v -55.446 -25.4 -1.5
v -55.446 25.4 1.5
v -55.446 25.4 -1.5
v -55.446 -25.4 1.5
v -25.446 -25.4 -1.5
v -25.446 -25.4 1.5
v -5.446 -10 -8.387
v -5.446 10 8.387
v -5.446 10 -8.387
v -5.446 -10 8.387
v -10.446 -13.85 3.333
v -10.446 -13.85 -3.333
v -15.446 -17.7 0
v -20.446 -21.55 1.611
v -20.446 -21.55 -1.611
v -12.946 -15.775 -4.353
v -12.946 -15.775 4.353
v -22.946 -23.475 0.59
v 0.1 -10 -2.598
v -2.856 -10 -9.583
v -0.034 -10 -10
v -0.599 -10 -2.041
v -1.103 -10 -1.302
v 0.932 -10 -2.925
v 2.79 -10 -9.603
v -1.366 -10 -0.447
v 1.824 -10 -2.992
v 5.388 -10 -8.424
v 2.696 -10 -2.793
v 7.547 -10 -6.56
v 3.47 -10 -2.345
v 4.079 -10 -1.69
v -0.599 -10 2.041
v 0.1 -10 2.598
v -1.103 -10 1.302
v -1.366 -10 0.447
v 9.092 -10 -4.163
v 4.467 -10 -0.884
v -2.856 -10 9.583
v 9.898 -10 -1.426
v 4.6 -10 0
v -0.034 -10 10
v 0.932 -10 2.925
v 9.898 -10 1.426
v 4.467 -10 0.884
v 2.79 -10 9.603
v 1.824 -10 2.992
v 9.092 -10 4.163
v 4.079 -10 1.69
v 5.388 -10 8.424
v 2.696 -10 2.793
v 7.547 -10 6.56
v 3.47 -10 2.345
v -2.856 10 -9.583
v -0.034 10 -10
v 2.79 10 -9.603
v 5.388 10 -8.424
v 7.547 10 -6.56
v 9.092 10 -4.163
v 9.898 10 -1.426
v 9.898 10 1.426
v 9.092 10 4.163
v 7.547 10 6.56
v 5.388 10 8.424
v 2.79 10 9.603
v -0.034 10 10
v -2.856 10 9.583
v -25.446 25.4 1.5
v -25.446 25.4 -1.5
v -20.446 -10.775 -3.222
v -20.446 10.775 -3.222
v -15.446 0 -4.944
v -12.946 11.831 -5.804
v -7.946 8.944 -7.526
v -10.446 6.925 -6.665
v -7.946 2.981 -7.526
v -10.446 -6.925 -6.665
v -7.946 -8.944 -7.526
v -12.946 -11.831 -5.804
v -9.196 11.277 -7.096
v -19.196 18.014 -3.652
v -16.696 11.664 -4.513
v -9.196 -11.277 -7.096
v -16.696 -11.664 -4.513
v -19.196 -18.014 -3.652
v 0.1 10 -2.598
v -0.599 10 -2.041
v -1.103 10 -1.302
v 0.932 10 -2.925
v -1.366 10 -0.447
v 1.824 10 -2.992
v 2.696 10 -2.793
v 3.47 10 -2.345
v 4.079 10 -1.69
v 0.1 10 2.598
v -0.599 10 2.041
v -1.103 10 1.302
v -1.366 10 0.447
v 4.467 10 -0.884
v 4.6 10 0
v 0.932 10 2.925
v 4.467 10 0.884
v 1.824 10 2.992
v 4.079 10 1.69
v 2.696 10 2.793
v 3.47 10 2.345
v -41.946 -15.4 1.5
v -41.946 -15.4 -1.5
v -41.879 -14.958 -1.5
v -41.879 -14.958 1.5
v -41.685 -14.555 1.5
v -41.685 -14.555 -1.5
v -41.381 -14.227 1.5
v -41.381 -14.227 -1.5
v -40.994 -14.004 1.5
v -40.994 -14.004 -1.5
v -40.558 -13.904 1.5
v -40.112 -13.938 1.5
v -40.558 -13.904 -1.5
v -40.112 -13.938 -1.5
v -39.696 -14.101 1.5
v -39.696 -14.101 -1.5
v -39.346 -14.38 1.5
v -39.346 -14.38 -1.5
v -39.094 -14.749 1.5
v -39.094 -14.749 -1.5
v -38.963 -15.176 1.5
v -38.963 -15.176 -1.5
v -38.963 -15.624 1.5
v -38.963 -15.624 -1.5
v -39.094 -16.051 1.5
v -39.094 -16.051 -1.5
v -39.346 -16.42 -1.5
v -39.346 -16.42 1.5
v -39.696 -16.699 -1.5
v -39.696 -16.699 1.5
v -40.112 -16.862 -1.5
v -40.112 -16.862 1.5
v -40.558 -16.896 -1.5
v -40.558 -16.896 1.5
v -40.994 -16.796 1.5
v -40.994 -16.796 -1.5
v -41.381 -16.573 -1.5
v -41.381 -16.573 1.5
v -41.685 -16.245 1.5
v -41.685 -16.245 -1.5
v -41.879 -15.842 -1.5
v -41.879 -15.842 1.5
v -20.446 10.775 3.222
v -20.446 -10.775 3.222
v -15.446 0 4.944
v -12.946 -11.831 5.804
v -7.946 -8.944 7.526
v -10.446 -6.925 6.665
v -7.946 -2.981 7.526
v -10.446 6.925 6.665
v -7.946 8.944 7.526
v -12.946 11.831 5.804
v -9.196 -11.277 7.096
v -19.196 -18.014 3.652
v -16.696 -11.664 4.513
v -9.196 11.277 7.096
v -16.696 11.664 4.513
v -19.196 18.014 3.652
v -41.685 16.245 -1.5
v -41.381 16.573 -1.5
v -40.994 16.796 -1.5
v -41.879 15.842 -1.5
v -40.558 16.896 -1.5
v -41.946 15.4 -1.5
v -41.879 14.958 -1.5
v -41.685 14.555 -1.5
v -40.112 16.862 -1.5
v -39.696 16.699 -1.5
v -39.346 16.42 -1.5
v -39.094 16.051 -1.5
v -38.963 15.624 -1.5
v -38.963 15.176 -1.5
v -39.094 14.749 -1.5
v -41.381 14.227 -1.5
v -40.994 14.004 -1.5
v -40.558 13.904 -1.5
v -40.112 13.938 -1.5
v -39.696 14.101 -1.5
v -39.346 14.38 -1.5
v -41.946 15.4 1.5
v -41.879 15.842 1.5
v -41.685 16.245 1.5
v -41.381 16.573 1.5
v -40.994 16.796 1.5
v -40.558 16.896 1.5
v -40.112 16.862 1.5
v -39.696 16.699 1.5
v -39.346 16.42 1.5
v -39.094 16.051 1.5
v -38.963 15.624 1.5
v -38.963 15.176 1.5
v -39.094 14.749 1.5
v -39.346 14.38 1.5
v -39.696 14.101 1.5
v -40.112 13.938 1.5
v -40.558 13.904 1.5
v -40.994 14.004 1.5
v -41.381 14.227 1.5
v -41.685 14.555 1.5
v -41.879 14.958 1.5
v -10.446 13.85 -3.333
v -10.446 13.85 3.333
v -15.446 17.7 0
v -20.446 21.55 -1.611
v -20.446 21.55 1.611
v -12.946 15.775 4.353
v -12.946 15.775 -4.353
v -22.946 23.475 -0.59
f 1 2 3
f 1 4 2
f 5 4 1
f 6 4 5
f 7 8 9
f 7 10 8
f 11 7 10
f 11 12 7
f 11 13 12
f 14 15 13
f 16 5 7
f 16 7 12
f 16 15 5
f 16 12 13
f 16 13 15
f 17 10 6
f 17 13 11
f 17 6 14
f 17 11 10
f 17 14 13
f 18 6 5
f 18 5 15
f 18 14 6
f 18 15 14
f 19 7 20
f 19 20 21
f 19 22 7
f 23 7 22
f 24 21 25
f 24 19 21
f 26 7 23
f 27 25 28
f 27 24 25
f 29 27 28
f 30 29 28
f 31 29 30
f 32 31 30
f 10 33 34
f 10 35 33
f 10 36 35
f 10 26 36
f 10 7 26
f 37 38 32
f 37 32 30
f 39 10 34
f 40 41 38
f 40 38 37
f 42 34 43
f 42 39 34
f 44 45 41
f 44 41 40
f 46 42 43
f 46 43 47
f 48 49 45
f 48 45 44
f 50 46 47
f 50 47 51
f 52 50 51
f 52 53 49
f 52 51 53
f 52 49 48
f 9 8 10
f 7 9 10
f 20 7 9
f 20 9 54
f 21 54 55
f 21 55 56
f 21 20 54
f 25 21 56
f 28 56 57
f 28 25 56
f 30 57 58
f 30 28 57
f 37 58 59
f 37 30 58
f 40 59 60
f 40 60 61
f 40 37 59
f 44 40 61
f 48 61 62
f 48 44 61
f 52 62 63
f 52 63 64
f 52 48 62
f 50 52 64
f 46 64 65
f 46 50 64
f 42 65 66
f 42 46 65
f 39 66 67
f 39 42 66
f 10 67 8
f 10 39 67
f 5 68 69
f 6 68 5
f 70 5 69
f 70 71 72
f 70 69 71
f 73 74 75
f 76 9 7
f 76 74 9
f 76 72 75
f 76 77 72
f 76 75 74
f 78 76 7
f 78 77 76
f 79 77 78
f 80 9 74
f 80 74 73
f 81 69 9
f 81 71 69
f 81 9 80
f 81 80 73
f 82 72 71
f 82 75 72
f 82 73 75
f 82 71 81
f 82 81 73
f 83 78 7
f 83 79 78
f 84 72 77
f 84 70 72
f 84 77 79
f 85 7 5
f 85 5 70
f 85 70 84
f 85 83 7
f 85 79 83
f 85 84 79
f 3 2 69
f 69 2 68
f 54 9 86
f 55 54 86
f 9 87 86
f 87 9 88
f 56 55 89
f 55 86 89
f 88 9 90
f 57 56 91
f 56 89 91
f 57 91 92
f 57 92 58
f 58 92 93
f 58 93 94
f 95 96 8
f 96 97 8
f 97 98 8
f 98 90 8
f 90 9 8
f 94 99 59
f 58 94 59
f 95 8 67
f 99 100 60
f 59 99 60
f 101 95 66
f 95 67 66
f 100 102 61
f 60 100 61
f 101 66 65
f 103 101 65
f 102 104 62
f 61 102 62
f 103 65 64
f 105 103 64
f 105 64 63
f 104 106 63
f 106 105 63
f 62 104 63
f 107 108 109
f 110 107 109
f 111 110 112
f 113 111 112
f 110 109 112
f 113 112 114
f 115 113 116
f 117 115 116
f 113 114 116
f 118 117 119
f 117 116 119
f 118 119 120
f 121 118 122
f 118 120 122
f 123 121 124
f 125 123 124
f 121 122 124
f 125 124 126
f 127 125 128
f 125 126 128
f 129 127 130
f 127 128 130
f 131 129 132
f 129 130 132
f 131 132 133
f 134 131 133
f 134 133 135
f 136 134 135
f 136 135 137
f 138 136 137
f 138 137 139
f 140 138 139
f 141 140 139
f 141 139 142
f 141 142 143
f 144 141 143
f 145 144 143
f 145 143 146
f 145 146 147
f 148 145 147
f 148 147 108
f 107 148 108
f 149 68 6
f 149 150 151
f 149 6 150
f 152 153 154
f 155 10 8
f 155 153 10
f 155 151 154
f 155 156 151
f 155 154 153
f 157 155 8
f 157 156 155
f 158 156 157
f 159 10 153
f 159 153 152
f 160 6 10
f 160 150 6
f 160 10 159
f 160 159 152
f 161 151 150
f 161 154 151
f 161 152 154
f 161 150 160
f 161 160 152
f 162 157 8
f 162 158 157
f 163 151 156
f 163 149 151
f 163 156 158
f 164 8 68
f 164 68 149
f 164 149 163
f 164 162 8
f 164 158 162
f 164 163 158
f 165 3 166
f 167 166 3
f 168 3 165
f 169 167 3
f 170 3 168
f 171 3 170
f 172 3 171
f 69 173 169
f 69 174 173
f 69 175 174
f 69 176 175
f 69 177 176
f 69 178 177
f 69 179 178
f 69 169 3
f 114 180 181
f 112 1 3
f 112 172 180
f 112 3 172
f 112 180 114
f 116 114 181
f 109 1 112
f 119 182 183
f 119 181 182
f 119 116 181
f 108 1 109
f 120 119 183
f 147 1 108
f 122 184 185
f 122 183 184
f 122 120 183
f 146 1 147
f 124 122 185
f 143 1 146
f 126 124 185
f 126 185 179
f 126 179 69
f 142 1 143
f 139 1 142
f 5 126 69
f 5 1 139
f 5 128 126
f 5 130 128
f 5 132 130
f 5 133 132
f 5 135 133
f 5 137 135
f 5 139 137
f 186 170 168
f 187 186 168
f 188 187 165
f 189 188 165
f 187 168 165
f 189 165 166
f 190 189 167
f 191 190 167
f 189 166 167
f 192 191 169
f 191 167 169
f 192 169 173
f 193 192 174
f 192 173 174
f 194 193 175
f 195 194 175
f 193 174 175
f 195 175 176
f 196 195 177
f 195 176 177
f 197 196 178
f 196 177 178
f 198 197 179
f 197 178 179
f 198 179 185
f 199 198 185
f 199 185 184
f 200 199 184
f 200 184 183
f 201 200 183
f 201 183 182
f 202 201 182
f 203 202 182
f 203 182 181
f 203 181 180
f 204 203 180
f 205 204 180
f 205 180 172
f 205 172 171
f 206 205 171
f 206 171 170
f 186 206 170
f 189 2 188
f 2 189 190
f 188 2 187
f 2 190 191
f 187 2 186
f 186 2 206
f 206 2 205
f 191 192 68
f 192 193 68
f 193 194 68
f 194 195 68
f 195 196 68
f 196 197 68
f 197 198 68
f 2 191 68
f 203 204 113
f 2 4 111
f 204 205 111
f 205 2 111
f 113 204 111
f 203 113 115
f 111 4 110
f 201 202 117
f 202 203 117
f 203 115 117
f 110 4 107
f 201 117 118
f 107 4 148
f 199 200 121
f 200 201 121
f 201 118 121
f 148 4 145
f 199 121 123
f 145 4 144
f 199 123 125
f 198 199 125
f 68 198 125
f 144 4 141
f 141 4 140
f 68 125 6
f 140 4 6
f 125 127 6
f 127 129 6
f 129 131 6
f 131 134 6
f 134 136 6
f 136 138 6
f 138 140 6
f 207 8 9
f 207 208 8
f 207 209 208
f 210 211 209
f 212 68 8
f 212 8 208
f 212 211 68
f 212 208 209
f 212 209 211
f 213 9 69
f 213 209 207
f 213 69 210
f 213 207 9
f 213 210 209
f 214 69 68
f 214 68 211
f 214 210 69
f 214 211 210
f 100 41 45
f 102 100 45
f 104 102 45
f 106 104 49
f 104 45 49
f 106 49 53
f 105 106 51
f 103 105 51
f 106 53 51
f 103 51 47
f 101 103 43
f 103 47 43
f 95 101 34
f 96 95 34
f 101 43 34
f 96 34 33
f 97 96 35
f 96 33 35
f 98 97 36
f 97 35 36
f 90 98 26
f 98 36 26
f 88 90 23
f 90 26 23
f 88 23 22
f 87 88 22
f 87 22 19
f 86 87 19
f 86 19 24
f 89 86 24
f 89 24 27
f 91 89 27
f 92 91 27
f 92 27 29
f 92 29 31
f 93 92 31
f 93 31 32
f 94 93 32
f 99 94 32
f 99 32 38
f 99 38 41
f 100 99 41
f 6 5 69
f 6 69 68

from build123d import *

# Parameters (mm, degrees)
F1_DEPTH   = 10
F3_D       = 6
F4_W       = 30
F4_H       = 1.5
F5_DEPTH   = 25.4
F1_FACE1_W = 20
F1_FACE1_H = 16.7741935484
F5_FACE_W  = 50.8
F5_FACE_H  = 3
F8_D       = 3


with BuildPart() as f1:
    # F0 (on Front) → F1 (new body, symmetric)
    with BuildSketch(Plane.XZ):
        with BuildLine():
            Line((-5.4457880697, 8.3870967742), (-5.4457880697, -8.3870967742))
            ThreePointArc((-5.4457880697, -8.3870967742), (10, 0), (-5.4457880697, 8.3870967742))
        make_face()
    extrude(amount=F1_DEPTH, both=True)

    # F3 (through all)
    with Locations(Plane(origin=(0, 10, 0), x_dir=(-1, 0, 0), z_dir=(0, 1, 0))):
        with Locations((-1.6, 0)):
            Hole(F3_D / 2)


with BuildPart() as f5:
    # F4 (on Front) → F5 (new body, symmetric)
    with BuildSketch(Plane.XZ):
        with Locations((-40.4457880697, -0.75)):
            Rectangle(F4_W, F4_H)
        with Locations((-40.4457880697, 0.75)):
            Rectangle(F4_W, F4_H)
    extrude(amount=F5_DEPTH, both=True)

    # F8 (through all)
    with Locations(Plane.XY.offset(1.5)):
        with Locations((-40.4457880697, 15.4), (-40.4457880697, -15.4)):
            Hole(F8_D / 2)


with BuildPart() as f6:
    # F1_face1 (on face) → F6 section 0
    with BuildSketch(Plane(origin=(-5.4457880697, 0, 0), x_dir=(0, -1, 0), z_dir=(-1, 0, 0))):
        Rectangle(F1_FACE1_W, F1_FACE1_H)
    # F5_face (on face) → F6 section 1
    with BuildSketch(Plane.YZ.offset(-25.4457880697)):
        Rectangle(F5_FACE_W, F5_FACE_H)
    loft()


solid = Compound([f1.part, f5.part, f6.part])
